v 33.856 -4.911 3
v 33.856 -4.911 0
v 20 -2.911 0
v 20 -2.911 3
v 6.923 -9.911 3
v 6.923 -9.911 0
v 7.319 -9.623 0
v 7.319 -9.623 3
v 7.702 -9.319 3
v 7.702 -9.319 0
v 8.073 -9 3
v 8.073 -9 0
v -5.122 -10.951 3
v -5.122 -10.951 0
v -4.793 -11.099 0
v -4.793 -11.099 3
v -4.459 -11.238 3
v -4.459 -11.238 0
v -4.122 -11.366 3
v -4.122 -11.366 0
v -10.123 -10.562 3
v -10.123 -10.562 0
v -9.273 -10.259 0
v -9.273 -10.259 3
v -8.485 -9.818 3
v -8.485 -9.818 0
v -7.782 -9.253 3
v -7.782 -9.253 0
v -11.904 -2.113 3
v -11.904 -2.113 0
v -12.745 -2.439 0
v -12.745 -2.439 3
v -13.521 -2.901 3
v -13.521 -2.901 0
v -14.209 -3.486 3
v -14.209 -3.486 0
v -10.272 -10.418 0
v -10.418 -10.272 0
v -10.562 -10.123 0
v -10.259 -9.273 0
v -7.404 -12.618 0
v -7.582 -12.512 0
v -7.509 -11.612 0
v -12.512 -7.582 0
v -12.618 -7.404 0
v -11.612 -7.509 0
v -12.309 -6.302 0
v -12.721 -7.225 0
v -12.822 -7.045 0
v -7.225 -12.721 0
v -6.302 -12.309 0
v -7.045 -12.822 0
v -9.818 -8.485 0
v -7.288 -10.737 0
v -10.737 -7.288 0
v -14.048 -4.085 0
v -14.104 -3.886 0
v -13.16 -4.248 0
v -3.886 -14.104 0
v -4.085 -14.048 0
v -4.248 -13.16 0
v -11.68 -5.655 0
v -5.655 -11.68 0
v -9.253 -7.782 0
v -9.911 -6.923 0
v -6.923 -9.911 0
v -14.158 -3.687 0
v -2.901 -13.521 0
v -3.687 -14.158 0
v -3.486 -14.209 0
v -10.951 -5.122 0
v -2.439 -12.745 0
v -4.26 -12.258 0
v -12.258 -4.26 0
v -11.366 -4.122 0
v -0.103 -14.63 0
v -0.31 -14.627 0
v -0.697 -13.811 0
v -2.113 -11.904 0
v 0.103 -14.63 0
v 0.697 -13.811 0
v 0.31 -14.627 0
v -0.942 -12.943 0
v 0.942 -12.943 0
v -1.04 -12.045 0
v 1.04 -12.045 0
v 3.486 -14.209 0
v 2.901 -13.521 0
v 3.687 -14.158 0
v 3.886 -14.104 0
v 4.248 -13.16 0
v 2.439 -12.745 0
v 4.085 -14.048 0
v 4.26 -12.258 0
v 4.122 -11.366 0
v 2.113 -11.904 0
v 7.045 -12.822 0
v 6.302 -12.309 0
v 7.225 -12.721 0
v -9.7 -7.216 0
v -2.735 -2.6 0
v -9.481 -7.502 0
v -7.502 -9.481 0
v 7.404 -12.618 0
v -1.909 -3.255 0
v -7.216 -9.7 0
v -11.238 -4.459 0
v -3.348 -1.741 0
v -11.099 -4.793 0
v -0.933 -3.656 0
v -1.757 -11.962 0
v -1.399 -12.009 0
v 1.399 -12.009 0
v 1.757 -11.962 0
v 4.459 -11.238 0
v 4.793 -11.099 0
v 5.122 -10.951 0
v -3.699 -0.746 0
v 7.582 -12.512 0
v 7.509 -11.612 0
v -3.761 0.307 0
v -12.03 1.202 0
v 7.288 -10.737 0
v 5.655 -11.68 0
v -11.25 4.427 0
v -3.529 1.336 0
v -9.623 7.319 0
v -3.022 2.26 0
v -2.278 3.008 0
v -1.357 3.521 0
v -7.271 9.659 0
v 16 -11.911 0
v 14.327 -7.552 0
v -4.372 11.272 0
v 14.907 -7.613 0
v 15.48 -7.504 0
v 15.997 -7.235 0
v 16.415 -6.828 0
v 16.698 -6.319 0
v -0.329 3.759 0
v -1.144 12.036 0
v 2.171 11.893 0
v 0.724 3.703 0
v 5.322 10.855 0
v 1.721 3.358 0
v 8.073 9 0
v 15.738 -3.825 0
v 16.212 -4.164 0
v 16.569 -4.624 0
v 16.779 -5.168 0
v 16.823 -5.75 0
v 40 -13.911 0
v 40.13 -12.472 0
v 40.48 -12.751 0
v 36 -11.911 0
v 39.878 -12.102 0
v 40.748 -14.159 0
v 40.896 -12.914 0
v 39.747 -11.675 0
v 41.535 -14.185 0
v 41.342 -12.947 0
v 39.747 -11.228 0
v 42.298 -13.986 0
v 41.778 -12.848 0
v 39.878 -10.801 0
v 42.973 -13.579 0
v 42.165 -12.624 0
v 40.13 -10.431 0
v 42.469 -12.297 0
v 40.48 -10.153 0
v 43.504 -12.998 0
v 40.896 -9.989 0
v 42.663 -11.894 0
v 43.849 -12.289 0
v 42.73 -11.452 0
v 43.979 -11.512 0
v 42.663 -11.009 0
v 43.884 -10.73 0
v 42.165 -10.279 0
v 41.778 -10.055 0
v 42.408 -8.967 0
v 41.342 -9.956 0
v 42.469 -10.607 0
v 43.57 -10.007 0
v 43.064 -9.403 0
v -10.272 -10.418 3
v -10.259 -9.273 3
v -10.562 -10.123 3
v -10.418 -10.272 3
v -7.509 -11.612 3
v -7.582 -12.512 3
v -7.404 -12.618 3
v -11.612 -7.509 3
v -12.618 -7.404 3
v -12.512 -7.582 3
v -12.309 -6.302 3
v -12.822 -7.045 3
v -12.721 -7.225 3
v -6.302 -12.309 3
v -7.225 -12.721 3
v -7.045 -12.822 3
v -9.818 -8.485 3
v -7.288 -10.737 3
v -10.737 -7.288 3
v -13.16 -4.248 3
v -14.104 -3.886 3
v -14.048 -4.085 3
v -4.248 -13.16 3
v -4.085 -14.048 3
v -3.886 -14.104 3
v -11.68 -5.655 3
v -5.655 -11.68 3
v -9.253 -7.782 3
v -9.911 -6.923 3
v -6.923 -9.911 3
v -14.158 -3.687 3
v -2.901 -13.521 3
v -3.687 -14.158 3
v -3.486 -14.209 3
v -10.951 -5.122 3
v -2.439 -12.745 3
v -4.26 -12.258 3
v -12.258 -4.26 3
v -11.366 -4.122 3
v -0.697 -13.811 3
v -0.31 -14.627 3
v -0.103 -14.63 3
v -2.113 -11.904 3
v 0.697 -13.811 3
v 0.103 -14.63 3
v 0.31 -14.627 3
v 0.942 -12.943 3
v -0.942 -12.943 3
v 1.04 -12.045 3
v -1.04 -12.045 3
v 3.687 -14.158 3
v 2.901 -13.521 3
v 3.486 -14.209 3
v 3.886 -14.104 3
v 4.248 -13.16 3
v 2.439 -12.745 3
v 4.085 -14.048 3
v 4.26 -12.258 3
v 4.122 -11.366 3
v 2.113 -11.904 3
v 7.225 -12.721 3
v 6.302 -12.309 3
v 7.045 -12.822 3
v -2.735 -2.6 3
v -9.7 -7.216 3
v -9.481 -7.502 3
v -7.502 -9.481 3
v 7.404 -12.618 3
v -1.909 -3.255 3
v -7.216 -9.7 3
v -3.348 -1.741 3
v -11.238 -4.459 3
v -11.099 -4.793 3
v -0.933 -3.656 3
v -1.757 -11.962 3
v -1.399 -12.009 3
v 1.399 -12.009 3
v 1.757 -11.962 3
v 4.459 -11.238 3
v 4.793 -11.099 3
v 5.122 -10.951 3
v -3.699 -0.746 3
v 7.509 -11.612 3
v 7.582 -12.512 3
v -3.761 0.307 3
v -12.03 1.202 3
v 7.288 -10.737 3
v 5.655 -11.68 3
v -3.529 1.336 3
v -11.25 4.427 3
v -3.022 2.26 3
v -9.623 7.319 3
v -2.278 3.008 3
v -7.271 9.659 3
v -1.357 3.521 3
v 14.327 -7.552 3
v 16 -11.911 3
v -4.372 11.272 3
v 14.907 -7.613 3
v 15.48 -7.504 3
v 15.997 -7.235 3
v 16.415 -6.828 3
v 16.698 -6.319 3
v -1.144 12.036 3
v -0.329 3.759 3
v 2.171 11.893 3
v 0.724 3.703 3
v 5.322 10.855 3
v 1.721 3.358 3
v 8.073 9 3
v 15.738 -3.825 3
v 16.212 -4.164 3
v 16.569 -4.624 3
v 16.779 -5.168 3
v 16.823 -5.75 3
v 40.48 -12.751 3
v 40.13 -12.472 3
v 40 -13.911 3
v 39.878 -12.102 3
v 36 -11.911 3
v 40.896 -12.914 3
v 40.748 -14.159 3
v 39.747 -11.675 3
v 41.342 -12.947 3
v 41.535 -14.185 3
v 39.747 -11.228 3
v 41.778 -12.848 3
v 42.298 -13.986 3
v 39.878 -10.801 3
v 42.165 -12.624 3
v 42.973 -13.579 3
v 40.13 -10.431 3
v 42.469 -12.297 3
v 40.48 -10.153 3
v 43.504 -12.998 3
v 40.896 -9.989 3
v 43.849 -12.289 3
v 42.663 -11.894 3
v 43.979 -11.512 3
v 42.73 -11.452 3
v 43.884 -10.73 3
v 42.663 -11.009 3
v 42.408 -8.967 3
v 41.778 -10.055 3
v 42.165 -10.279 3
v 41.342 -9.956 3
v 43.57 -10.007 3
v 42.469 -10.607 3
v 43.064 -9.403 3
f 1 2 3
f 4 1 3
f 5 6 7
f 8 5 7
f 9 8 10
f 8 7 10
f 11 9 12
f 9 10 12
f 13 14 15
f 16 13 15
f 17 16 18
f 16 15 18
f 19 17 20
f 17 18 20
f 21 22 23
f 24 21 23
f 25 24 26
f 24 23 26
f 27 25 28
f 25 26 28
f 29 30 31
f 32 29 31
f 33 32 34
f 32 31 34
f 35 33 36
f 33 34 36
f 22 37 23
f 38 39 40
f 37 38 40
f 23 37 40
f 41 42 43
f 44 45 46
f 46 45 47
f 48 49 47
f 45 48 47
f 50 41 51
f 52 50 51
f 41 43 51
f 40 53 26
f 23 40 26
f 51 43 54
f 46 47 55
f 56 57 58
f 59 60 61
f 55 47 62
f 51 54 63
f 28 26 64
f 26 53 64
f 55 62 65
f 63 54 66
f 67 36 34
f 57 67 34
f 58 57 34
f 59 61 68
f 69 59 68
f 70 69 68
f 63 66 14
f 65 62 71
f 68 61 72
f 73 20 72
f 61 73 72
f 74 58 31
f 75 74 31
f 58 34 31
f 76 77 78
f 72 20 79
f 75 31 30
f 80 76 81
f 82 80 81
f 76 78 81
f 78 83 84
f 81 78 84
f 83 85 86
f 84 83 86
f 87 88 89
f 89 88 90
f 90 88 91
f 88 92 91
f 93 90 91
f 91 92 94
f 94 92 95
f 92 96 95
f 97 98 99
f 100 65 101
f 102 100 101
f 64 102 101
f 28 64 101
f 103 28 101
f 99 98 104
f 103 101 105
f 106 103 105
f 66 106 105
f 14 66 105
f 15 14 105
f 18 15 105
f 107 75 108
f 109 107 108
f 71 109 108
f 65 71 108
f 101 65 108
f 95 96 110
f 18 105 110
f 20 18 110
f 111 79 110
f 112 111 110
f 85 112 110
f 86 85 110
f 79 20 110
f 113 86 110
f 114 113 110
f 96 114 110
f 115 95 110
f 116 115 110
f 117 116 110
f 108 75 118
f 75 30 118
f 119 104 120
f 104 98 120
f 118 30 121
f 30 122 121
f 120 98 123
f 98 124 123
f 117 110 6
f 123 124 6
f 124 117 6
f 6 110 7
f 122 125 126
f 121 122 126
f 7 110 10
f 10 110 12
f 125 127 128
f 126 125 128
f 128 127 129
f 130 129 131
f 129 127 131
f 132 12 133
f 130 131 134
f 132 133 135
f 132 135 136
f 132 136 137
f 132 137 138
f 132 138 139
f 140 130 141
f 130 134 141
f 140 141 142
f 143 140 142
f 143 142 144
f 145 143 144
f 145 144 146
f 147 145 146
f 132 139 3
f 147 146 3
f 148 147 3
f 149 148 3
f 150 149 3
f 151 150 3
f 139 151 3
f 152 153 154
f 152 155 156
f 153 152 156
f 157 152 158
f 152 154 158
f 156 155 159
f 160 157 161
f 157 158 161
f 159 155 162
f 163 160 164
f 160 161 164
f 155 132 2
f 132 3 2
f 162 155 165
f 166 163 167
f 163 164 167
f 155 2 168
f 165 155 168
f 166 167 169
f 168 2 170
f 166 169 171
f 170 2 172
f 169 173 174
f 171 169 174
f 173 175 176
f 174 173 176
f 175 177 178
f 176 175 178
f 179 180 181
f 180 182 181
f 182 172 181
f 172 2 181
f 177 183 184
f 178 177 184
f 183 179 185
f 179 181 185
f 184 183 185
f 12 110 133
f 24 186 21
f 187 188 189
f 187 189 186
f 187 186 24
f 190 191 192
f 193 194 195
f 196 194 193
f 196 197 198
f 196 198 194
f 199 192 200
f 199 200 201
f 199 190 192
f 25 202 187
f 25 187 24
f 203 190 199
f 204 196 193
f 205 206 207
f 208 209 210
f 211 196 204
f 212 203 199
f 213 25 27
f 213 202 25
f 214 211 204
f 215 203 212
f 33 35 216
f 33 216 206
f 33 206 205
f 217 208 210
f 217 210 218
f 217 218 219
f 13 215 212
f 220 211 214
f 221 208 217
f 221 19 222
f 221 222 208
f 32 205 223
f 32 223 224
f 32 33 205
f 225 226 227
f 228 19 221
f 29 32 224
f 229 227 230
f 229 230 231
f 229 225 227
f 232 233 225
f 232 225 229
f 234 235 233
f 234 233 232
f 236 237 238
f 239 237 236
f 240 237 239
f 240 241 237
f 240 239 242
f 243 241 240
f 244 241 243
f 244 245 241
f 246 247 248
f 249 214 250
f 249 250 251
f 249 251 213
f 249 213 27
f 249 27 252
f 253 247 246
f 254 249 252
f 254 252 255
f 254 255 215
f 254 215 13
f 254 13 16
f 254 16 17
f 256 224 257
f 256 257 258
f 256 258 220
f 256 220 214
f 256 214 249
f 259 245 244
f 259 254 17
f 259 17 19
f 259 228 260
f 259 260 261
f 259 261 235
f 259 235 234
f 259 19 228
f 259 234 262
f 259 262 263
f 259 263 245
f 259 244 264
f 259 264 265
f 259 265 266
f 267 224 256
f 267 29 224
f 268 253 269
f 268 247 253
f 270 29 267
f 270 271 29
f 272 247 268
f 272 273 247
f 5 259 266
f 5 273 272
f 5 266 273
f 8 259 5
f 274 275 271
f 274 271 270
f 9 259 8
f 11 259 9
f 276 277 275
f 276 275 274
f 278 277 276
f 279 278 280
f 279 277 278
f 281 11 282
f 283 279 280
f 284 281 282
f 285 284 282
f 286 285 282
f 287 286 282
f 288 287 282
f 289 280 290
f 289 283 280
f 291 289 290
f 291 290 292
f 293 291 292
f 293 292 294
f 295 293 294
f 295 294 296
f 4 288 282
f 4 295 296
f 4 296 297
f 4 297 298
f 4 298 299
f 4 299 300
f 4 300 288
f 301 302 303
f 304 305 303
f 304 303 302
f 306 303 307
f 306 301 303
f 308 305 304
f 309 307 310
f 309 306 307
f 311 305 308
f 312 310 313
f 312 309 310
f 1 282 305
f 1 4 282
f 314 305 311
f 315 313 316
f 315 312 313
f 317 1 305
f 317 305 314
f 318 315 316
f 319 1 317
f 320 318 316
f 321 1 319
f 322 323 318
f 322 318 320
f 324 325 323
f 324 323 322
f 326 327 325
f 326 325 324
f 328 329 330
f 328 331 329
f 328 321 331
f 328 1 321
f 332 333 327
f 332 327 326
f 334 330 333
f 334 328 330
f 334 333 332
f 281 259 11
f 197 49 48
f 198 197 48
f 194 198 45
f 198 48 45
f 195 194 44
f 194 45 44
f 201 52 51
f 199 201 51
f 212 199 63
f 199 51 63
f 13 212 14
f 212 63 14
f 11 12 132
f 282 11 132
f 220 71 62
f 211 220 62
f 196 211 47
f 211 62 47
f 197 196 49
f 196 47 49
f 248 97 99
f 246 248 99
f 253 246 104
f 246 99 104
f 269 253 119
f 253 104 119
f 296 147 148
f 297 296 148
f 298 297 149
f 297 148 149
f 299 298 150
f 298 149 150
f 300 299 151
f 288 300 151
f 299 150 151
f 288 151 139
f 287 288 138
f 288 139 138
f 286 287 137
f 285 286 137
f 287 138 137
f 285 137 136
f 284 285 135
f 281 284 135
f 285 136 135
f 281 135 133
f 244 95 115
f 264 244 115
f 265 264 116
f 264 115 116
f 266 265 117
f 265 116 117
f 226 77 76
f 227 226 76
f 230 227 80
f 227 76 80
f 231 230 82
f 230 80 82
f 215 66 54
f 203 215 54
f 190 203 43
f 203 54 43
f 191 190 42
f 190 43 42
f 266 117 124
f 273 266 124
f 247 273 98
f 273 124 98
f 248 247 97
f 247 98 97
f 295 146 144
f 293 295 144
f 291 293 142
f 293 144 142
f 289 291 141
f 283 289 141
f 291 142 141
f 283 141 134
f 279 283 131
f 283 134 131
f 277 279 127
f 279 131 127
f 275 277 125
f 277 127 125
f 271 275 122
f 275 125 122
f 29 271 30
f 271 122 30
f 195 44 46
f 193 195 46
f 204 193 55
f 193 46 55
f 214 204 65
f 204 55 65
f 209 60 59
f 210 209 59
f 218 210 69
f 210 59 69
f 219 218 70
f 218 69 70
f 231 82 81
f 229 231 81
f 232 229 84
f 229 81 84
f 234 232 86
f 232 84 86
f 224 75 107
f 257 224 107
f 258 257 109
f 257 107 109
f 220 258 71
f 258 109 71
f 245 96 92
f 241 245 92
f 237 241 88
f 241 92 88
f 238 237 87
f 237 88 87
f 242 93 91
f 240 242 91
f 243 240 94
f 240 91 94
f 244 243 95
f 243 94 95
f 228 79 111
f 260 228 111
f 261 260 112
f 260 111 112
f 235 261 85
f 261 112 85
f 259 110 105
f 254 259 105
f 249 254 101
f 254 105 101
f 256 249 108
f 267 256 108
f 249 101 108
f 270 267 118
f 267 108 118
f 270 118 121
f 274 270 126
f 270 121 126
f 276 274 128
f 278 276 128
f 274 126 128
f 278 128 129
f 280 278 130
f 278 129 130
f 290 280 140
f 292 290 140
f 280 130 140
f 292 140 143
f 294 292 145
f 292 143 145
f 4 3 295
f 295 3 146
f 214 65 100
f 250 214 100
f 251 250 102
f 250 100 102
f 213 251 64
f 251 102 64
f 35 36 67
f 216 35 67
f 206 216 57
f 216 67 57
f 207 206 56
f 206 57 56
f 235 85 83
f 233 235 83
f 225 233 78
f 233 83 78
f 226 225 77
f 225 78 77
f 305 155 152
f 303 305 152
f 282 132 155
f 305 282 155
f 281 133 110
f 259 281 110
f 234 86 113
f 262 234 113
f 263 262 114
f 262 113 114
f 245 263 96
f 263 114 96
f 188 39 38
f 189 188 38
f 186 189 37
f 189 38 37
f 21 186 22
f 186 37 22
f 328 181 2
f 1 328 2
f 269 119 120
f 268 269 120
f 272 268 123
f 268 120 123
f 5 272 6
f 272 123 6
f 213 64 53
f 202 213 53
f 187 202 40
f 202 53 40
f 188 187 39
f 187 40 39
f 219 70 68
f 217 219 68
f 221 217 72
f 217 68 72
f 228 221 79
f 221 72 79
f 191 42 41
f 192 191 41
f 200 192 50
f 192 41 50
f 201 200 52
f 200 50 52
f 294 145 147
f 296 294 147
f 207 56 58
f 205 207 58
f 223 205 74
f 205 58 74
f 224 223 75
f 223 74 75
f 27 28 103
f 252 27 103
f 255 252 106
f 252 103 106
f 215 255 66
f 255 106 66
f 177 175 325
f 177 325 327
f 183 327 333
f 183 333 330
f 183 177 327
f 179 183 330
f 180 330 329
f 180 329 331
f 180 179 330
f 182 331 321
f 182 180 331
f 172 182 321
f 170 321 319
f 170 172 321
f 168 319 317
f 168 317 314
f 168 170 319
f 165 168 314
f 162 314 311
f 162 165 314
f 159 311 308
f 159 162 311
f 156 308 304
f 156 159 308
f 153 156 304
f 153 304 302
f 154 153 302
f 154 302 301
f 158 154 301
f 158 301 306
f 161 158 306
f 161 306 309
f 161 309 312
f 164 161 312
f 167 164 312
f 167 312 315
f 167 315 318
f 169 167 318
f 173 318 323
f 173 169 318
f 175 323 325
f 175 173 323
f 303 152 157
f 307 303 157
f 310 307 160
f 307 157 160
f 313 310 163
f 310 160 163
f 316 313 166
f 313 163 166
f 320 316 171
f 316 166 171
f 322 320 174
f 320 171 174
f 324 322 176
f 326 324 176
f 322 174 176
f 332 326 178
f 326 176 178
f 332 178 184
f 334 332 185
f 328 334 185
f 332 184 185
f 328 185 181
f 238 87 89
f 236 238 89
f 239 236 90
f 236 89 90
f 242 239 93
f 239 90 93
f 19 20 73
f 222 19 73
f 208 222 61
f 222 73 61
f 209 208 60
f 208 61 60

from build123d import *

# Parameters (mm, degrees)
SKETCH2_R           = 1.5
BOSS_EXTRUDE2_DEPTH = 3
CUT_EXTRUDE2_DEPTH  = 3


with BuildPart() as part:
    # Sketch2 → Boss-Extrude2 (new body)
    with BuildSketch(Plane.XY):
        with BuildLine():
            Line((33.856406461, -4.911436862), (20, -2.911436862))
            Line((20, -2.911436862), (8.072676136, 9))
            ThreePointArc((8.072676136, 9), (-5.877422545, 10.565226179), (-11.903927815, -2.112960617))
            ThreePointArc((-11.903927815, -2.112960617), (-13.14288127, -2.654199937), (-14.208555951, -3.486235477))
            ThreePointArc((-14.208555951, -3.486235477), (-14.131494839, -3.78652263), (-14.048088143, -4.085109489))
            ThreePointArc((-14.048088143, -4.085109489), (-12.709169027, -4.272836063), (-11.365584201, -4.122086336))
            ThreePointArc((-11.365584201, -4.122086336), (-11.169703548, -4.626642697), (-10.951436862, -5.12192646))
            ThreePointArc((-10.951436862, -5.12192646), (-12.008090957, -5.965388247), (-12.82210701, -7.044889767))
            ThreePointArc((-12.82210701, -7.044889767), (-12.669951657, -7.315), (-12.51210701, -7.581825517))
            ThreePointArc((-12.51210701, -7.581825517), (-11.170223244, -7.416617696), (-9.911436862, -6.9232593))
            ThreePointArc((-9.911436862, -6.9232593), (-9.591641884, -7.359925677), (-9.252623584, -7.781841479))
            ThreePointArc((-9.252623584, -7.781841479), (-10.05496909, -8.870045207), (-10.561852666, -10.123446462))
            ThreePointArc((-10.561852666, -10.123446462), (-10.344972209, -10.344972209), (-10.123446462, -10.561852666))
            ThreePointArc((-10.123446462, -10.561852666), (-8.870045207, -10.05496909), (-7.781841479, -9.252623584))
            ThreePointArc((-7.781841479, -9.252623584), (-7.359925677, -9.591641884), (-6.9232593, -9.911436862))
            ThreePointArc((-6.9232593, -9.911436862), (-7.416617696, -11.170223244), (-7.581825517, -12.51210701))
            ThreePointArc((-7.581825517, -12.51210701), (-7.315, -12.669951657), (-7.044889767, -12.82210701))
            ThreePointArc((-7.044889767, -12.82210701), (-5.965388247, -12.008090957), (-5.12192646, -10.951436862))
            ThreePointArc((-5.12192646, -10.951436862), (-4.626642697, -11.169703548), (-4.122086336, -11.365584201))
            ThreePointArc((-4.122086336, -11.365584201), (-4.272836063, -12.709169027), (-4.085109489, -14.048088143))
            ThreePointArc((-4.085109489, -14.048088143), (-3.78652263, -14.131494839), (-3.486235477, -14.208555951))
            ThreePointArc((-3.486235477, -14.208555951), (-2.654199937, -13.14288127), (-2.112960617, -11.903927815))
            ThreePointArc((-2.112960617, -11.903927815), (-1.578061664, -11.986568374), (-1.04, -12.04518576))
            ThreePointArc((-1.04, -12.04518576), (-0.837867713, -13.382005944), (-0.31, -14.626715284))
            ThreePointArc((-0.31, -14.626715284), (0, -14.63), (0.31, -14.626715284))
            ThreePointArc((0.31, -14.626715284), (0.837867713, -13.382005944), (1.04, -12.04518576))
            ThreePointArc((1.04, -12.04518576), (1.578061664, -11.986568374), (2.112960617, -11.903927815))
            ThreePointArc((2.112960617, -11.903927815), (2.654199937, -13.14288127), (3.486235477, -14.208555951))
            ThreePointArc((3.486235477, -14.208555951), (3.78652263, -14.131494839), (4.085109489, -14.048088143))
            ThreePointArc((4.085109489, -14.048088143), (4.272836063, -12.709169027), (4.122086336, -11.365584201))
            ThreePointArc((4.122086336, -11.365584201), (4.626642697, -11.169703548), (5.12192646, -10.951436862))
            ThreePointArc((5.12192646, -10.951436862), (5.965388247, -12.008090957), (7.044889767, -12.82210701))
            ThreePointArc((7.044889767, -12.82210701), (7.315, -12.669951657), (7.581825517, -12.51210701))
            ThreePointArc((7.581825517, -12.51210701), (7.416617696, -11.170223244), (6.9232593, -9.911436862))
            ThreePointArc((6.9232593, -9.911436862), (7.51180399, -9.473167412), (8.072676136, -9))
            Line((8.072676136, -9), (16, -11.911436862))
            Line((16, -11.911436862), (36, -11.911436862))
            Line((36, -11.911436862), (40, -13.911436862))
            ThreePointArc((40, -13.911436862), (43.70240259, -12.65581862), (42.40824957, -8.966708962))
            Line((42.40824957, -8.966708962), (33.856406461, -4.911436862))
        make_face()
        with Locations((41.229904242, -11.451628378)):
            Circle(SKETCH2_R, mode=Mode.SUBTRACT)
    extrude(amount=BOSS_EXTRUDE2_DEPTH)

    # Sketch4 → Cut-Extrude2 (cut)
    with BuildSketch(Plane(origin=(0, 0, 0), x_dir=(-1, 0, 0), z_dir=(0, 0, -1))):
        with BuildLine():
            Line((-1.721055129, 3.358246048), (-15.737581702, -3.825031953))
            ThreePointArc((-15.737581702, -3.825031953), (-16.698373457, -6.319012023), (-14.327181541, -7.55210013))
            Line((-14.327181541, -7.55210013), (0.933399378, -3.656311376))
            ThreePointArc((0.933399378, -3.656311376), (3.529320665, 1.335568388), (-1.721055129, 3.358246048))
        make_face()
    extrude(amount=-CUT_EXTRUDE2_DEPTH, mode=Mode.SUBTRACT)


solid = part.part
